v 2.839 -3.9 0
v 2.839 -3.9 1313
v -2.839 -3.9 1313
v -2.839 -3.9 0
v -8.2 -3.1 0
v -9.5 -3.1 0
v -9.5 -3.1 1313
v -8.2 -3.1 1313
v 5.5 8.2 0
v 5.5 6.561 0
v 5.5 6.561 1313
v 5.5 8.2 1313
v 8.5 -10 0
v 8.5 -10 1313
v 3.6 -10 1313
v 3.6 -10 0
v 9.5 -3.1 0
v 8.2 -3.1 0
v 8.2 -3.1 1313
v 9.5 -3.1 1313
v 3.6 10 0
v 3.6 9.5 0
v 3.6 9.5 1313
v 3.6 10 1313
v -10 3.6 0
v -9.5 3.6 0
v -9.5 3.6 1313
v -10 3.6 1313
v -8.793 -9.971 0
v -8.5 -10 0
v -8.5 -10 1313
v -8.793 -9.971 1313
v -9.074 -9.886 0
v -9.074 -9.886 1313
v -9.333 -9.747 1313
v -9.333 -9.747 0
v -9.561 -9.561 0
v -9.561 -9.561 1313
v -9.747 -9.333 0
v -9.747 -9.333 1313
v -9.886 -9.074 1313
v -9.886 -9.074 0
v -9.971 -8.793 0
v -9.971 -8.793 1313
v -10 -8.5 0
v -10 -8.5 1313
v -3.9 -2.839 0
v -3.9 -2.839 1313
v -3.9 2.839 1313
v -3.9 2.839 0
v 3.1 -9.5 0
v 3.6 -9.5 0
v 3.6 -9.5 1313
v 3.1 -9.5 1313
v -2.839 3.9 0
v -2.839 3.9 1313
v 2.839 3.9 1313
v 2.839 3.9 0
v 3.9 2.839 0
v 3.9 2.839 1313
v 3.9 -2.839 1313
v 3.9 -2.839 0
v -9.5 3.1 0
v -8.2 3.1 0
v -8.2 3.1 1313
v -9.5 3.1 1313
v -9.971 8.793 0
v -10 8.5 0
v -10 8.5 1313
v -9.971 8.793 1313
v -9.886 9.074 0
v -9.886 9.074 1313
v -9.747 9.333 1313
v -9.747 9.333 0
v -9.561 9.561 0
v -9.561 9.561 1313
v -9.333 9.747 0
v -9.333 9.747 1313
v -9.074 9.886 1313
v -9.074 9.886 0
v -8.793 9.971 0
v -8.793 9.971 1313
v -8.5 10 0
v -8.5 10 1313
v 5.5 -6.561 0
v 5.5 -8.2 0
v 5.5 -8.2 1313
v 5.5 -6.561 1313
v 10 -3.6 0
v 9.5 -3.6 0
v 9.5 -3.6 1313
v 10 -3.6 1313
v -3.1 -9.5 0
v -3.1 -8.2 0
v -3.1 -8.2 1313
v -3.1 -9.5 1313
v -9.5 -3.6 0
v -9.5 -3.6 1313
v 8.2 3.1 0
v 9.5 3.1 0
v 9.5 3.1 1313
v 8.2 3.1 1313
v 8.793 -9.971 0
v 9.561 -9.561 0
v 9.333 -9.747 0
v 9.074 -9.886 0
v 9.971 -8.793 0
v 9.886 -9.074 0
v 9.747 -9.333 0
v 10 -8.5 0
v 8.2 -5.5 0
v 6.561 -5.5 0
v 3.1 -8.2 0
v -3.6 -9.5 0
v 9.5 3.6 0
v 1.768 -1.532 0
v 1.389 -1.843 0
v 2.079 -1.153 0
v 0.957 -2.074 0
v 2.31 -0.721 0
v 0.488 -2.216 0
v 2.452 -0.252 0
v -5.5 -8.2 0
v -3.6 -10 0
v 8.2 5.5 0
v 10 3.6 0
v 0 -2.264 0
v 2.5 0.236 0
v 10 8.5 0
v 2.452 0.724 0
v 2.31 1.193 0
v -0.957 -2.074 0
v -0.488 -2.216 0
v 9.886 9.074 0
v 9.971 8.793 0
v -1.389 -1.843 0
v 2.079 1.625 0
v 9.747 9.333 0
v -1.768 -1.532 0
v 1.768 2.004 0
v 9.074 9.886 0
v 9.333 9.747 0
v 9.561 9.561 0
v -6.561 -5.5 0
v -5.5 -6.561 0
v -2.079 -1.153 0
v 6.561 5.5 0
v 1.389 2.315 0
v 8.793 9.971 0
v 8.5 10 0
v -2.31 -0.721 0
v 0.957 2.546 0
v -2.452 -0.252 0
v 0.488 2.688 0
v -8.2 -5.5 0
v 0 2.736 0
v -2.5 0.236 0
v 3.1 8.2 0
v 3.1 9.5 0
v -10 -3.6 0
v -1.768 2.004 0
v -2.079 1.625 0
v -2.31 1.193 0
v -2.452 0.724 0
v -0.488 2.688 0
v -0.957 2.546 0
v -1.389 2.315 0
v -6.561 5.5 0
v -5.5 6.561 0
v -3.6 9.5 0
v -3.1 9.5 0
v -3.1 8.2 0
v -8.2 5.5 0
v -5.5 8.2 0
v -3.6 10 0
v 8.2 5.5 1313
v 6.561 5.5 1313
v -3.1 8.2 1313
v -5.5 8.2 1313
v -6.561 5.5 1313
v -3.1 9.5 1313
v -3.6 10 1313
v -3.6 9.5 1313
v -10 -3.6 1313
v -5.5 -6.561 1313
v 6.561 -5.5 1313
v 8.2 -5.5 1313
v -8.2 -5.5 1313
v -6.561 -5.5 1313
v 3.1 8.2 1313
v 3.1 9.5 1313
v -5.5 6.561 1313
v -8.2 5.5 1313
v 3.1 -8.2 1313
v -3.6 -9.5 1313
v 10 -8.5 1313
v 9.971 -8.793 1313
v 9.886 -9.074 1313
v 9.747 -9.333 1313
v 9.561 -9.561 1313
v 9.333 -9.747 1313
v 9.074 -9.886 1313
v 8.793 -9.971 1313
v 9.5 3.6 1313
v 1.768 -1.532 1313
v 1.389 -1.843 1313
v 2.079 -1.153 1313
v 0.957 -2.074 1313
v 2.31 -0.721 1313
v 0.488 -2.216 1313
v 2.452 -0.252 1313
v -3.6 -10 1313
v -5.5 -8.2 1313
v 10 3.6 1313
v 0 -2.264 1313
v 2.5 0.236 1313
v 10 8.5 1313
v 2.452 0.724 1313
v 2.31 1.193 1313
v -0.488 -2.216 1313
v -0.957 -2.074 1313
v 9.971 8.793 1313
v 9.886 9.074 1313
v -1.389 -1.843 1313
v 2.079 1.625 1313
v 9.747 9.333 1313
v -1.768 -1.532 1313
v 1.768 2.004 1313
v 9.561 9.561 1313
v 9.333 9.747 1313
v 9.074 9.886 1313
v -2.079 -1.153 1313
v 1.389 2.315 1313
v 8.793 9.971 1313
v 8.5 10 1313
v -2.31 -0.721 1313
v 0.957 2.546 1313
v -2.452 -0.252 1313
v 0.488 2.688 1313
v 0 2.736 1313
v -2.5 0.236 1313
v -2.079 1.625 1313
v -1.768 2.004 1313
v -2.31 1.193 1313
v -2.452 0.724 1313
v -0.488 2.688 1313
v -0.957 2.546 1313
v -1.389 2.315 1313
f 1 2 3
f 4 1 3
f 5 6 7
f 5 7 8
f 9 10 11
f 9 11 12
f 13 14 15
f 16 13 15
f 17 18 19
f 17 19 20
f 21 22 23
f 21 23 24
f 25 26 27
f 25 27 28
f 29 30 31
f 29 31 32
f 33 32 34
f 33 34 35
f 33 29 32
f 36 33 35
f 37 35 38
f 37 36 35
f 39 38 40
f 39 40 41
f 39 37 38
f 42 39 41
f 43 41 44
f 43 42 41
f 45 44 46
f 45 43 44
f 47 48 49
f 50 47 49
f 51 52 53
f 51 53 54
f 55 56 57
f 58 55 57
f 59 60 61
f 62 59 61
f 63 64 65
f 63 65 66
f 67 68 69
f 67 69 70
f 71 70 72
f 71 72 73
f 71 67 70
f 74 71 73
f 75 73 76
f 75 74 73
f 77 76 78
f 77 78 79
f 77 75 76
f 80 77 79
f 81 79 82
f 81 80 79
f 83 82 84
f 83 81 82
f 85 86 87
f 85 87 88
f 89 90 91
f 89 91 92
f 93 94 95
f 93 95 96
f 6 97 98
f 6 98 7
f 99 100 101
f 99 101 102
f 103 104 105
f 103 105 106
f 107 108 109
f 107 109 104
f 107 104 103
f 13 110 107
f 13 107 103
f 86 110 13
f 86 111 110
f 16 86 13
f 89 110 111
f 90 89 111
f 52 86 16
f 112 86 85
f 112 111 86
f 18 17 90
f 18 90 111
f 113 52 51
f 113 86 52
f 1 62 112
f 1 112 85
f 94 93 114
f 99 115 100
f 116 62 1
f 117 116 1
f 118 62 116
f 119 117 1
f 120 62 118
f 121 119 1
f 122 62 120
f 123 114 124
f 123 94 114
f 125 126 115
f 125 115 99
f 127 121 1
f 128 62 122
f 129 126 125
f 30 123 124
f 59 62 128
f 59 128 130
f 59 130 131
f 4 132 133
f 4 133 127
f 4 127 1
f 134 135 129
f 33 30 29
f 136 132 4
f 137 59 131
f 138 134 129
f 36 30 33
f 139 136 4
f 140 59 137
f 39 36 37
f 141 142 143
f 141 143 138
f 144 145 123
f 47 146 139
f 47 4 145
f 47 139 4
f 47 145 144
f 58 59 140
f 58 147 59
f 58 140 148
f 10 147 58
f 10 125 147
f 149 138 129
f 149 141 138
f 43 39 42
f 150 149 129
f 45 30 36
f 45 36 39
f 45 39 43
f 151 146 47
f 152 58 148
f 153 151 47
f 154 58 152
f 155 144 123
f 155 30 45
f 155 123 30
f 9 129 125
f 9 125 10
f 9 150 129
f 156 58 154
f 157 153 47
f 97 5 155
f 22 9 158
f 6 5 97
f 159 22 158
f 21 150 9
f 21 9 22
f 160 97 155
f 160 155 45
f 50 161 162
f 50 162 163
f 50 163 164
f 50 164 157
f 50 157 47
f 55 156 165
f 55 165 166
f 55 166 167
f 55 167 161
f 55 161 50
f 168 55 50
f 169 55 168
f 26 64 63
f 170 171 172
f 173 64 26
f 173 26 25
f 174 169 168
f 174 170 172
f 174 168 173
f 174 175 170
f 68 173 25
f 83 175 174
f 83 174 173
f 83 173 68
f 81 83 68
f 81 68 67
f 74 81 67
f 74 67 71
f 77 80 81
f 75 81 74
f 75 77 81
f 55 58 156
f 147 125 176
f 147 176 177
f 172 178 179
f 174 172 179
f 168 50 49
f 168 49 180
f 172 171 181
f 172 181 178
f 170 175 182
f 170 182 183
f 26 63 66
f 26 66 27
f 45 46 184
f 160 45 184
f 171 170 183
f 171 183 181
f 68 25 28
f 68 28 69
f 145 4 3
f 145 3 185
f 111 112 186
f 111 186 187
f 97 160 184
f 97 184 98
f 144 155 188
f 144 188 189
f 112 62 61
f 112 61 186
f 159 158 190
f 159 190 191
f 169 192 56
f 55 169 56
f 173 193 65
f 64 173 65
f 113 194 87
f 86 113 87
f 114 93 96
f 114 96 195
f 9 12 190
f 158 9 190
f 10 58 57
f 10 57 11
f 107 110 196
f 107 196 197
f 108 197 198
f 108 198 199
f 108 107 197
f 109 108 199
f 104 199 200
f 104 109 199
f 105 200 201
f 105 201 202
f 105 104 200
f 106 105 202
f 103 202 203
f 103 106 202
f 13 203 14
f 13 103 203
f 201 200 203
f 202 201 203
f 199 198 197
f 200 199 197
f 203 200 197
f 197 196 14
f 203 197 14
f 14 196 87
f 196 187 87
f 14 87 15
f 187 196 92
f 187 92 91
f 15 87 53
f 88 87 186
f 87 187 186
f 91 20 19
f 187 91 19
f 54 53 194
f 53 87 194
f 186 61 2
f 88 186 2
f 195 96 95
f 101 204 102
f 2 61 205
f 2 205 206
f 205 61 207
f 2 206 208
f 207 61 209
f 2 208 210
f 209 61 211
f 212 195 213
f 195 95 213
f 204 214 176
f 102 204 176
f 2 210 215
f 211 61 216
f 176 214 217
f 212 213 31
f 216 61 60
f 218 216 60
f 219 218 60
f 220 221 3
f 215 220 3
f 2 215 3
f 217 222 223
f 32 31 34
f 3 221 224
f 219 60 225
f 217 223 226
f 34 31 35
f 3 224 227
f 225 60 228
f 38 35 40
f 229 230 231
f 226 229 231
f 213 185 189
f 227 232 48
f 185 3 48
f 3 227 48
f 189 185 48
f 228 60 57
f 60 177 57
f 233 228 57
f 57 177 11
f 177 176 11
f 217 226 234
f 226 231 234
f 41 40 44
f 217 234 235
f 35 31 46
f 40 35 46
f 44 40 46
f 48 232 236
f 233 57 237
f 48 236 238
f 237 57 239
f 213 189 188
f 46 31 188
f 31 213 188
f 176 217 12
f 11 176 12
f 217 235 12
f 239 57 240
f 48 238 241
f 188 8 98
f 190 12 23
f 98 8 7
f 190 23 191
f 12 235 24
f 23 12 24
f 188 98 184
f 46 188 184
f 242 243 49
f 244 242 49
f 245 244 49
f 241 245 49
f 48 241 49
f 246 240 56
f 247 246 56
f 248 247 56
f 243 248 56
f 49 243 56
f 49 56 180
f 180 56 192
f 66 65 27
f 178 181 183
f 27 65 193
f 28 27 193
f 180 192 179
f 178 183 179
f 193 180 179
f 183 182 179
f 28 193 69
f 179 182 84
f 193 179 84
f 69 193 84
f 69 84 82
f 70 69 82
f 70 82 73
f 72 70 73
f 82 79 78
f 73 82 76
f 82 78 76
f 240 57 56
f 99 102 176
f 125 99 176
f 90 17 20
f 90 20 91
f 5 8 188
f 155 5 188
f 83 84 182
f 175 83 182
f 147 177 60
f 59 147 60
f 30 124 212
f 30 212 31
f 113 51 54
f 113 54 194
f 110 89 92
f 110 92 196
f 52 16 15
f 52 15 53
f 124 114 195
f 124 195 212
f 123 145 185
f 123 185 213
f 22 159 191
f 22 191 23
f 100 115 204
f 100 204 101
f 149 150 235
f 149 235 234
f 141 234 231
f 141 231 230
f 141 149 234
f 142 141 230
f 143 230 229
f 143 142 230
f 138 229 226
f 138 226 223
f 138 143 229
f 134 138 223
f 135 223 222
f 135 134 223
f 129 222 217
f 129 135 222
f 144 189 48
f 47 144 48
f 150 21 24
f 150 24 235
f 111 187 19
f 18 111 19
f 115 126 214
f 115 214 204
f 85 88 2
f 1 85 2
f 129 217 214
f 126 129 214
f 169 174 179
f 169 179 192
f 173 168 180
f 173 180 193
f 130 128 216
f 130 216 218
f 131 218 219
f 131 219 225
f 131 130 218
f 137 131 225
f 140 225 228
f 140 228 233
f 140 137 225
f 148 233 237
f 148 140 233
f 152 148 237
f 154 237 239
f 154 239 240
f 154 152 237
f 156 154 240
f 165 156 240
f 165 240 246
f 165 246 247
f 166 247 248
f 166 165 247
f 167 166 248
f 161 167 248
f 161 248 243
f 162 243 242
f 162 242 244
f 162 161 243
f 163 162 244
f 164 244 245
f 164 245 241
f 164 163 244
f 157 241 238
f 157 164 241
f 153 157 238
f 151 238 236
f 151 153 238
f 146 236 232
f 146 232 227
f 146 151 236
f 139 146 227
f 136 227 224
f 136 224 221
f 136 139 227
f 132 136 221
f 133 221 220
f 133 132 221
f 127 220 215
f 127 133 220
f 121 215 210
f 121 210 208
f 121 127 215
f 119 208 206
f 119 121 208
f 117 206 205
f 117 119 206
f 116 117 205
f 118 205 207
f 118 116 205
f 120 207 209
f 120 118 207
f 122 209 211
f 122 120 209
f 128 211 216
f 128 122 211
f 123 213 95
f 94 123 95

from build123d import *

# Parameters (mm, degrees)
SKETCH1_R           = 2.5
BOSS_EXTRUDE1_DEPTH = 1313


with BuildPart() as part:
    # Sketch1 → Boss-Extrude1 (new body)
    with BuildSketch(Plane.XY):
        with BuildLine():
            Line((2.839339828, 3.9), (5.5, 6.560660172))
            Line((5.5, 6.560660172), (5.5, 8.2))
            Line((5.5, 8.2), (3.1, 8.2))
            Line((3.1, 8.2), (3.1, 9.5))
            Line((3.1, 9.5), (3.6, 9.5))
            Line((3.6, 9.5), (3.6, 10))
            Line((3.6, 10), (8.5, 10))
            ThreePointArc((8.5, 10), (9.560660172, 9.560660172), (10, 8.5))
            Line((10, 8.5), (10, 3.6))
            Line((10, 3.6), (9.5, 3.6))
            Line((9.5, 3.6), (9.5, 3.1))
            Line((9.5, 3.1), (8.2, 3.1))
            Line((8.2, 3.1), (8.2, 5.5))
            Line((8.2, 5.5), (6.560660172, 5.5))
            Line((6.560660172, 5.5), (3.9, 2.839339828))
            Line((3.9, 2.839339828), (3.9, -2.839339828))
            Line((3.9, -2.839339828), (6.560660172, -5.5))
            Line((6.560660172, -5.5), (8.2, -5.5))
            Line((8.2, -5.5), (8.2, -3.1))
            Line((8.2, -3.1), (9.5, -3.1))
            Line((9.5, -3.1), (9.5, -3.6))
            Line((9.5, -3.6), (10, -3.6))
            Line((10, -3.6), (10, -8.5))
            ThreePointArc((10, -8.5), (9.560660172, -9.560660172), (8.5, -10))
            Line((8.5, -10), (3.6, -10))
            Line((3.6, -10), (3.6, -9.5))
            Line((3.6, -9.5), (3.1, -9.5))
            Line((3.1, -9.5), (3.1, -8.2))
            Line((3.1, -8.2), (5.5, -8.2))
            Line((5.5, -8.2), (5.5, -6.560660172))
            Line((5.5, -6.560660172), (2.839339828, -3.9))
            Line((2.839339828, -3.9), (-2.839339828, -3.9))
            Line((-2.839339828, -3.9), (-5.5, -6.560660172))
            Line((-5.5, -6.560660172), (-5.5, -8.2))
            Line((-5.5, -8.2), (-3.1, -8.2))
            Line((-3.1, -8.2), (-3.1, -9.5))
            Line((-3.1, -9.5), (-3.6, -9.5))
            Line((-3.6, -9.5), (-3.6, -10))
            Line((-3.6, -10), (-8.5, -10))
            ThreePointArc((-8.5, -10), (-9.560660172, -9.560660172), (-10, -8.5))
            Line((-10, -8.5), (-10, -3.6))
            Line((-10, -3.6), (-9.5, -3.6))
            Line((-9.5, -3.6), (-9.5, -3.1))
            Line((-9.5, -3.1), (-8.2, -3.1))
            Line((-8.2, -3.1), (-8.2, -5.5))
            Line((-8.2, -5.5), (-6.560660172, -5.5))
            Line((-6.560660172, -5.5), (-3.9, -2.839339828))
            Line((-3.9, -2.839339828), (-3.9, 2.839339828))
            Line((-3.9, 2.839339828), (-6.560660172, 5.5))
            Line((-6.560660172, 5.5), (-8.2, 5.5))
            Line((-8.2, 5.5), (-8.2, 3.1))
            Line((-8.2, 3.1), (-9.5, 3.1))
            Line((-9.5, 3.1), (-9.5, 3.6))
            Line((-9.5, 3.6), (-10, 3.6))
            Line((-10, 3.6), (-10, 8.5))
            ThreePointArc((-10, 8.5), (-9.560660172, 9.560660172), (-8.5, 10))
            Line((-8.5, 10), (-3.6, 10))
            Line((-3.6, 10), (-3.6, 9.5))
            Line((-3.6, 9.5), (-3.1, 9.5))
            Line((-3.1, 9.5), (-3.1, 8.2))
            Line((-3.1, 8.2), (-5.5, 8.2))
            Line((-5.5, 8.2), (-5.5, 6.560660172))
            Line((-5.5, 6.560660172), (-2.839339828, 3.9))
            Line((-2.839339828, 3.9), (2.839339828, 3.9))
        make_face()
        with Locations((0, 0.235847297)):
            Circle(SKETCH1_R, mode=Mode.SUBTRACT)
    extrude(amount=BOSS_EXTRUDE1_DEPTH)


solid = part.part
